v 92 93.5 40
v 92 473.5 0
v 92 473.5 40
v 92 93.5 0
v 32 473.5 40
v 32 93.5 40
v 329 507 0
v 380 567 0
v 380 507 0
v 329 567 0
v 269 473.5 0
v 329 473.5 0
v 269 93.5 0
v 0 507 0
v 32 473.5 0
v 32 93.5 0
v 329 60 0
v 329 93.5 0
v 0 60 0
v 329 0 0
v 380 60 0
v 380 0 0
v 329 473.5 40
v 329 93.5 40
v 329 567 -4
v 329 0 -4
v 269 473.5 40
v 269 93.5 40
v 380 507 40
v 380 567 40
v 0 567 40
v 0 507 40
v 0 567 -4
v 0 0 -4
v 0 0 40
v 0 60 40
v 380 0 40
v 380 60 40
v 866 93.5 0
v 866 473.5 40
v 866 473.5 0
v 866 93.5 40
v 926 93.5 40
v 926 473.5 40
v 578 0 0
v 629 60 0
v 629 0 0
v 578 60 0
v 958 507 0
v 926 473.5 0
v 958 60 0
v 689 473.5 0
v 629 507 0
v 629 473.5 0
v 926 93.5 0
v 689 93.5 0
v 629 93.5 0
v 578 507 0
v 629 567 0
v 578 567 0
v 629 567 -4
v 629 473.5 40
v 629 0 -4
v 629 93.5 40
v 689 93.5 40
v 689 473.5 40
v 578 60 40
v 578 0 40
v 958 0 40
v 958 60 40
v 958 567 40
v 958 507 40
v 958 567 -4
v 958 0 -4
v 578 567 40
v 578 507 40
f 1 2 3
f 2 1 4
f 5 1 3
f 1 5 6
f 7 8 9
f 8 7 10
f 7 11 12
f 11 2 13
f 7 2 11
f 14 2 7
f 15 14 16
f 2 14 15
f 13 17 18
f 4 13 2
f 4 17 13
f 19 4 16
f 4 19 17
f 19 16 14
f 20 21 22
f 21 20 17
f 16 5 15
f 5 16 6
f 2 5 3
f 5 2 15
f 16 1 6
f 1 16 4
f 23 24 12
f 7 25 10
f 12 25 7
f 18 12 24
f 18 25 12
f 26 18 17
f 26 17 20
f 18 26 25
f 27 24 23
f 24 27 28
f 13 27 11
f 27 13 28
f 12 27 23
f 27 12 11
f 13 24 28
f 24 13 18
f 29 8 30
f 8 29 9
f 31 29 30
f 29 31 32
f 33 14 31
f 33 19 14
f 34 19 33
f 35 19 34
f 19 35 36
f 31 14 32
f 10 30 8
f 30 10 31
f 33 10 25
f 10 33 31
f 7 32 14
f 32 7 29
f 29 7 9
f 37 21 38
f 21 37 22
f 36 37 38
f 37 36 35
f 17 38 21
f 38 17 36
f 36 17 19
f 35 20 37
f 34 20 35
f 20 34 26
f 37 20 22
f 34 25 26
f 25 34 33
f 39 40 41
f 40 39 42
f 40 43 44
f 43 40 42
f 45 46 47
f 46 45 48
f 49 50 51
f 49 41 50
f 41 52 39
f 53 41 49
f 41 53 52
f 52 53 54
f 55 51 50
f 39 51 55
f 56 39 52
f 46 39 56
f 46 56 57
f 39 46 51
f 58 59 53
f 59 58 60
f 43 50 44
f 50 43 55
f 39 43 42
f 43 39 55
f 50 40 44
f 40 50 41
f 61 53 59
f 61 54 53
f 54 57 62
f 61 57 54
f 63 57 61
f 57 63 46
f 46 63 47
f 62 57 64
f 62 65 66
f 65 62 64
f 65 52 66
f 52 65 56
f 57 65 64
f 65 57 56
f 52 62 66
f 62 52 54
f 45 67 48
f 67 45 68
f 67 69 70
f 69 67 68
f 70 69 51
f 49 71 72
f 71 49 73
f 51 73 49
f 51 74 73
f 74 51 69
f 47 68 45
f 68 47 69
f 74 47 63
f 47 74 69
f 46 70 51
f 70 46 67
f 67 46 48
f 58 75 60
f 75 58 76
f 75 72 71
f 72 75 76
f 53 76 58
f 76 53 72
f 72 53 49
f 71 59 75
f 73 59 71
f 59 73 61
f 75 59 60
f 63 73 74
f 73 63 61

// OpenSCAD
// Schweißtisch geschlossen

vkr_h=40;
vkr_l=380;
vkr_b=60;

p_h=4;
p_l=567;
p_b=329;

clear=2;
dist=300;

module mod() {
    // 1. bar
    translate([vkr_b/2+clear,(p_l-vkr_l)/2,0]) {
        color( "Yellow", 1.0 ) {
            cube([vkr_b,vkr_l,vkr_h], 0);
        };
    };
    
    // 2. bar
    translate([p_b-vkr_b,(p_l-vkr_l)/2,0]) {
        color( "Lime", 1.0 ) {
            cube([vkr_b,vkr_l,vkr_h], 0);
        };
    };

    // 3. bar
    translate([0,p_l-vkr_b,0]) {
        color( "ForestGreen", 1.0 ) {
            cube([vkr_l,vkr_b,vkr_h], 0);
        };
    };
    
    // 4. bar
    translate([0,0,0]) {
        color( "Olive", 1.0 ) {
            cube([vkr_l,vkr_b,vkr_h], 0);
        };
    };

    // Plate
    translate([0,0,-p_h]) {
        cube([p_b,p_l,p_h], 0);
    };
};

mod();

translate([p_b*2+dist,p_l,0]) {
    rotate(a=180, v=[0,0,1]){
        mod();
    };
};
